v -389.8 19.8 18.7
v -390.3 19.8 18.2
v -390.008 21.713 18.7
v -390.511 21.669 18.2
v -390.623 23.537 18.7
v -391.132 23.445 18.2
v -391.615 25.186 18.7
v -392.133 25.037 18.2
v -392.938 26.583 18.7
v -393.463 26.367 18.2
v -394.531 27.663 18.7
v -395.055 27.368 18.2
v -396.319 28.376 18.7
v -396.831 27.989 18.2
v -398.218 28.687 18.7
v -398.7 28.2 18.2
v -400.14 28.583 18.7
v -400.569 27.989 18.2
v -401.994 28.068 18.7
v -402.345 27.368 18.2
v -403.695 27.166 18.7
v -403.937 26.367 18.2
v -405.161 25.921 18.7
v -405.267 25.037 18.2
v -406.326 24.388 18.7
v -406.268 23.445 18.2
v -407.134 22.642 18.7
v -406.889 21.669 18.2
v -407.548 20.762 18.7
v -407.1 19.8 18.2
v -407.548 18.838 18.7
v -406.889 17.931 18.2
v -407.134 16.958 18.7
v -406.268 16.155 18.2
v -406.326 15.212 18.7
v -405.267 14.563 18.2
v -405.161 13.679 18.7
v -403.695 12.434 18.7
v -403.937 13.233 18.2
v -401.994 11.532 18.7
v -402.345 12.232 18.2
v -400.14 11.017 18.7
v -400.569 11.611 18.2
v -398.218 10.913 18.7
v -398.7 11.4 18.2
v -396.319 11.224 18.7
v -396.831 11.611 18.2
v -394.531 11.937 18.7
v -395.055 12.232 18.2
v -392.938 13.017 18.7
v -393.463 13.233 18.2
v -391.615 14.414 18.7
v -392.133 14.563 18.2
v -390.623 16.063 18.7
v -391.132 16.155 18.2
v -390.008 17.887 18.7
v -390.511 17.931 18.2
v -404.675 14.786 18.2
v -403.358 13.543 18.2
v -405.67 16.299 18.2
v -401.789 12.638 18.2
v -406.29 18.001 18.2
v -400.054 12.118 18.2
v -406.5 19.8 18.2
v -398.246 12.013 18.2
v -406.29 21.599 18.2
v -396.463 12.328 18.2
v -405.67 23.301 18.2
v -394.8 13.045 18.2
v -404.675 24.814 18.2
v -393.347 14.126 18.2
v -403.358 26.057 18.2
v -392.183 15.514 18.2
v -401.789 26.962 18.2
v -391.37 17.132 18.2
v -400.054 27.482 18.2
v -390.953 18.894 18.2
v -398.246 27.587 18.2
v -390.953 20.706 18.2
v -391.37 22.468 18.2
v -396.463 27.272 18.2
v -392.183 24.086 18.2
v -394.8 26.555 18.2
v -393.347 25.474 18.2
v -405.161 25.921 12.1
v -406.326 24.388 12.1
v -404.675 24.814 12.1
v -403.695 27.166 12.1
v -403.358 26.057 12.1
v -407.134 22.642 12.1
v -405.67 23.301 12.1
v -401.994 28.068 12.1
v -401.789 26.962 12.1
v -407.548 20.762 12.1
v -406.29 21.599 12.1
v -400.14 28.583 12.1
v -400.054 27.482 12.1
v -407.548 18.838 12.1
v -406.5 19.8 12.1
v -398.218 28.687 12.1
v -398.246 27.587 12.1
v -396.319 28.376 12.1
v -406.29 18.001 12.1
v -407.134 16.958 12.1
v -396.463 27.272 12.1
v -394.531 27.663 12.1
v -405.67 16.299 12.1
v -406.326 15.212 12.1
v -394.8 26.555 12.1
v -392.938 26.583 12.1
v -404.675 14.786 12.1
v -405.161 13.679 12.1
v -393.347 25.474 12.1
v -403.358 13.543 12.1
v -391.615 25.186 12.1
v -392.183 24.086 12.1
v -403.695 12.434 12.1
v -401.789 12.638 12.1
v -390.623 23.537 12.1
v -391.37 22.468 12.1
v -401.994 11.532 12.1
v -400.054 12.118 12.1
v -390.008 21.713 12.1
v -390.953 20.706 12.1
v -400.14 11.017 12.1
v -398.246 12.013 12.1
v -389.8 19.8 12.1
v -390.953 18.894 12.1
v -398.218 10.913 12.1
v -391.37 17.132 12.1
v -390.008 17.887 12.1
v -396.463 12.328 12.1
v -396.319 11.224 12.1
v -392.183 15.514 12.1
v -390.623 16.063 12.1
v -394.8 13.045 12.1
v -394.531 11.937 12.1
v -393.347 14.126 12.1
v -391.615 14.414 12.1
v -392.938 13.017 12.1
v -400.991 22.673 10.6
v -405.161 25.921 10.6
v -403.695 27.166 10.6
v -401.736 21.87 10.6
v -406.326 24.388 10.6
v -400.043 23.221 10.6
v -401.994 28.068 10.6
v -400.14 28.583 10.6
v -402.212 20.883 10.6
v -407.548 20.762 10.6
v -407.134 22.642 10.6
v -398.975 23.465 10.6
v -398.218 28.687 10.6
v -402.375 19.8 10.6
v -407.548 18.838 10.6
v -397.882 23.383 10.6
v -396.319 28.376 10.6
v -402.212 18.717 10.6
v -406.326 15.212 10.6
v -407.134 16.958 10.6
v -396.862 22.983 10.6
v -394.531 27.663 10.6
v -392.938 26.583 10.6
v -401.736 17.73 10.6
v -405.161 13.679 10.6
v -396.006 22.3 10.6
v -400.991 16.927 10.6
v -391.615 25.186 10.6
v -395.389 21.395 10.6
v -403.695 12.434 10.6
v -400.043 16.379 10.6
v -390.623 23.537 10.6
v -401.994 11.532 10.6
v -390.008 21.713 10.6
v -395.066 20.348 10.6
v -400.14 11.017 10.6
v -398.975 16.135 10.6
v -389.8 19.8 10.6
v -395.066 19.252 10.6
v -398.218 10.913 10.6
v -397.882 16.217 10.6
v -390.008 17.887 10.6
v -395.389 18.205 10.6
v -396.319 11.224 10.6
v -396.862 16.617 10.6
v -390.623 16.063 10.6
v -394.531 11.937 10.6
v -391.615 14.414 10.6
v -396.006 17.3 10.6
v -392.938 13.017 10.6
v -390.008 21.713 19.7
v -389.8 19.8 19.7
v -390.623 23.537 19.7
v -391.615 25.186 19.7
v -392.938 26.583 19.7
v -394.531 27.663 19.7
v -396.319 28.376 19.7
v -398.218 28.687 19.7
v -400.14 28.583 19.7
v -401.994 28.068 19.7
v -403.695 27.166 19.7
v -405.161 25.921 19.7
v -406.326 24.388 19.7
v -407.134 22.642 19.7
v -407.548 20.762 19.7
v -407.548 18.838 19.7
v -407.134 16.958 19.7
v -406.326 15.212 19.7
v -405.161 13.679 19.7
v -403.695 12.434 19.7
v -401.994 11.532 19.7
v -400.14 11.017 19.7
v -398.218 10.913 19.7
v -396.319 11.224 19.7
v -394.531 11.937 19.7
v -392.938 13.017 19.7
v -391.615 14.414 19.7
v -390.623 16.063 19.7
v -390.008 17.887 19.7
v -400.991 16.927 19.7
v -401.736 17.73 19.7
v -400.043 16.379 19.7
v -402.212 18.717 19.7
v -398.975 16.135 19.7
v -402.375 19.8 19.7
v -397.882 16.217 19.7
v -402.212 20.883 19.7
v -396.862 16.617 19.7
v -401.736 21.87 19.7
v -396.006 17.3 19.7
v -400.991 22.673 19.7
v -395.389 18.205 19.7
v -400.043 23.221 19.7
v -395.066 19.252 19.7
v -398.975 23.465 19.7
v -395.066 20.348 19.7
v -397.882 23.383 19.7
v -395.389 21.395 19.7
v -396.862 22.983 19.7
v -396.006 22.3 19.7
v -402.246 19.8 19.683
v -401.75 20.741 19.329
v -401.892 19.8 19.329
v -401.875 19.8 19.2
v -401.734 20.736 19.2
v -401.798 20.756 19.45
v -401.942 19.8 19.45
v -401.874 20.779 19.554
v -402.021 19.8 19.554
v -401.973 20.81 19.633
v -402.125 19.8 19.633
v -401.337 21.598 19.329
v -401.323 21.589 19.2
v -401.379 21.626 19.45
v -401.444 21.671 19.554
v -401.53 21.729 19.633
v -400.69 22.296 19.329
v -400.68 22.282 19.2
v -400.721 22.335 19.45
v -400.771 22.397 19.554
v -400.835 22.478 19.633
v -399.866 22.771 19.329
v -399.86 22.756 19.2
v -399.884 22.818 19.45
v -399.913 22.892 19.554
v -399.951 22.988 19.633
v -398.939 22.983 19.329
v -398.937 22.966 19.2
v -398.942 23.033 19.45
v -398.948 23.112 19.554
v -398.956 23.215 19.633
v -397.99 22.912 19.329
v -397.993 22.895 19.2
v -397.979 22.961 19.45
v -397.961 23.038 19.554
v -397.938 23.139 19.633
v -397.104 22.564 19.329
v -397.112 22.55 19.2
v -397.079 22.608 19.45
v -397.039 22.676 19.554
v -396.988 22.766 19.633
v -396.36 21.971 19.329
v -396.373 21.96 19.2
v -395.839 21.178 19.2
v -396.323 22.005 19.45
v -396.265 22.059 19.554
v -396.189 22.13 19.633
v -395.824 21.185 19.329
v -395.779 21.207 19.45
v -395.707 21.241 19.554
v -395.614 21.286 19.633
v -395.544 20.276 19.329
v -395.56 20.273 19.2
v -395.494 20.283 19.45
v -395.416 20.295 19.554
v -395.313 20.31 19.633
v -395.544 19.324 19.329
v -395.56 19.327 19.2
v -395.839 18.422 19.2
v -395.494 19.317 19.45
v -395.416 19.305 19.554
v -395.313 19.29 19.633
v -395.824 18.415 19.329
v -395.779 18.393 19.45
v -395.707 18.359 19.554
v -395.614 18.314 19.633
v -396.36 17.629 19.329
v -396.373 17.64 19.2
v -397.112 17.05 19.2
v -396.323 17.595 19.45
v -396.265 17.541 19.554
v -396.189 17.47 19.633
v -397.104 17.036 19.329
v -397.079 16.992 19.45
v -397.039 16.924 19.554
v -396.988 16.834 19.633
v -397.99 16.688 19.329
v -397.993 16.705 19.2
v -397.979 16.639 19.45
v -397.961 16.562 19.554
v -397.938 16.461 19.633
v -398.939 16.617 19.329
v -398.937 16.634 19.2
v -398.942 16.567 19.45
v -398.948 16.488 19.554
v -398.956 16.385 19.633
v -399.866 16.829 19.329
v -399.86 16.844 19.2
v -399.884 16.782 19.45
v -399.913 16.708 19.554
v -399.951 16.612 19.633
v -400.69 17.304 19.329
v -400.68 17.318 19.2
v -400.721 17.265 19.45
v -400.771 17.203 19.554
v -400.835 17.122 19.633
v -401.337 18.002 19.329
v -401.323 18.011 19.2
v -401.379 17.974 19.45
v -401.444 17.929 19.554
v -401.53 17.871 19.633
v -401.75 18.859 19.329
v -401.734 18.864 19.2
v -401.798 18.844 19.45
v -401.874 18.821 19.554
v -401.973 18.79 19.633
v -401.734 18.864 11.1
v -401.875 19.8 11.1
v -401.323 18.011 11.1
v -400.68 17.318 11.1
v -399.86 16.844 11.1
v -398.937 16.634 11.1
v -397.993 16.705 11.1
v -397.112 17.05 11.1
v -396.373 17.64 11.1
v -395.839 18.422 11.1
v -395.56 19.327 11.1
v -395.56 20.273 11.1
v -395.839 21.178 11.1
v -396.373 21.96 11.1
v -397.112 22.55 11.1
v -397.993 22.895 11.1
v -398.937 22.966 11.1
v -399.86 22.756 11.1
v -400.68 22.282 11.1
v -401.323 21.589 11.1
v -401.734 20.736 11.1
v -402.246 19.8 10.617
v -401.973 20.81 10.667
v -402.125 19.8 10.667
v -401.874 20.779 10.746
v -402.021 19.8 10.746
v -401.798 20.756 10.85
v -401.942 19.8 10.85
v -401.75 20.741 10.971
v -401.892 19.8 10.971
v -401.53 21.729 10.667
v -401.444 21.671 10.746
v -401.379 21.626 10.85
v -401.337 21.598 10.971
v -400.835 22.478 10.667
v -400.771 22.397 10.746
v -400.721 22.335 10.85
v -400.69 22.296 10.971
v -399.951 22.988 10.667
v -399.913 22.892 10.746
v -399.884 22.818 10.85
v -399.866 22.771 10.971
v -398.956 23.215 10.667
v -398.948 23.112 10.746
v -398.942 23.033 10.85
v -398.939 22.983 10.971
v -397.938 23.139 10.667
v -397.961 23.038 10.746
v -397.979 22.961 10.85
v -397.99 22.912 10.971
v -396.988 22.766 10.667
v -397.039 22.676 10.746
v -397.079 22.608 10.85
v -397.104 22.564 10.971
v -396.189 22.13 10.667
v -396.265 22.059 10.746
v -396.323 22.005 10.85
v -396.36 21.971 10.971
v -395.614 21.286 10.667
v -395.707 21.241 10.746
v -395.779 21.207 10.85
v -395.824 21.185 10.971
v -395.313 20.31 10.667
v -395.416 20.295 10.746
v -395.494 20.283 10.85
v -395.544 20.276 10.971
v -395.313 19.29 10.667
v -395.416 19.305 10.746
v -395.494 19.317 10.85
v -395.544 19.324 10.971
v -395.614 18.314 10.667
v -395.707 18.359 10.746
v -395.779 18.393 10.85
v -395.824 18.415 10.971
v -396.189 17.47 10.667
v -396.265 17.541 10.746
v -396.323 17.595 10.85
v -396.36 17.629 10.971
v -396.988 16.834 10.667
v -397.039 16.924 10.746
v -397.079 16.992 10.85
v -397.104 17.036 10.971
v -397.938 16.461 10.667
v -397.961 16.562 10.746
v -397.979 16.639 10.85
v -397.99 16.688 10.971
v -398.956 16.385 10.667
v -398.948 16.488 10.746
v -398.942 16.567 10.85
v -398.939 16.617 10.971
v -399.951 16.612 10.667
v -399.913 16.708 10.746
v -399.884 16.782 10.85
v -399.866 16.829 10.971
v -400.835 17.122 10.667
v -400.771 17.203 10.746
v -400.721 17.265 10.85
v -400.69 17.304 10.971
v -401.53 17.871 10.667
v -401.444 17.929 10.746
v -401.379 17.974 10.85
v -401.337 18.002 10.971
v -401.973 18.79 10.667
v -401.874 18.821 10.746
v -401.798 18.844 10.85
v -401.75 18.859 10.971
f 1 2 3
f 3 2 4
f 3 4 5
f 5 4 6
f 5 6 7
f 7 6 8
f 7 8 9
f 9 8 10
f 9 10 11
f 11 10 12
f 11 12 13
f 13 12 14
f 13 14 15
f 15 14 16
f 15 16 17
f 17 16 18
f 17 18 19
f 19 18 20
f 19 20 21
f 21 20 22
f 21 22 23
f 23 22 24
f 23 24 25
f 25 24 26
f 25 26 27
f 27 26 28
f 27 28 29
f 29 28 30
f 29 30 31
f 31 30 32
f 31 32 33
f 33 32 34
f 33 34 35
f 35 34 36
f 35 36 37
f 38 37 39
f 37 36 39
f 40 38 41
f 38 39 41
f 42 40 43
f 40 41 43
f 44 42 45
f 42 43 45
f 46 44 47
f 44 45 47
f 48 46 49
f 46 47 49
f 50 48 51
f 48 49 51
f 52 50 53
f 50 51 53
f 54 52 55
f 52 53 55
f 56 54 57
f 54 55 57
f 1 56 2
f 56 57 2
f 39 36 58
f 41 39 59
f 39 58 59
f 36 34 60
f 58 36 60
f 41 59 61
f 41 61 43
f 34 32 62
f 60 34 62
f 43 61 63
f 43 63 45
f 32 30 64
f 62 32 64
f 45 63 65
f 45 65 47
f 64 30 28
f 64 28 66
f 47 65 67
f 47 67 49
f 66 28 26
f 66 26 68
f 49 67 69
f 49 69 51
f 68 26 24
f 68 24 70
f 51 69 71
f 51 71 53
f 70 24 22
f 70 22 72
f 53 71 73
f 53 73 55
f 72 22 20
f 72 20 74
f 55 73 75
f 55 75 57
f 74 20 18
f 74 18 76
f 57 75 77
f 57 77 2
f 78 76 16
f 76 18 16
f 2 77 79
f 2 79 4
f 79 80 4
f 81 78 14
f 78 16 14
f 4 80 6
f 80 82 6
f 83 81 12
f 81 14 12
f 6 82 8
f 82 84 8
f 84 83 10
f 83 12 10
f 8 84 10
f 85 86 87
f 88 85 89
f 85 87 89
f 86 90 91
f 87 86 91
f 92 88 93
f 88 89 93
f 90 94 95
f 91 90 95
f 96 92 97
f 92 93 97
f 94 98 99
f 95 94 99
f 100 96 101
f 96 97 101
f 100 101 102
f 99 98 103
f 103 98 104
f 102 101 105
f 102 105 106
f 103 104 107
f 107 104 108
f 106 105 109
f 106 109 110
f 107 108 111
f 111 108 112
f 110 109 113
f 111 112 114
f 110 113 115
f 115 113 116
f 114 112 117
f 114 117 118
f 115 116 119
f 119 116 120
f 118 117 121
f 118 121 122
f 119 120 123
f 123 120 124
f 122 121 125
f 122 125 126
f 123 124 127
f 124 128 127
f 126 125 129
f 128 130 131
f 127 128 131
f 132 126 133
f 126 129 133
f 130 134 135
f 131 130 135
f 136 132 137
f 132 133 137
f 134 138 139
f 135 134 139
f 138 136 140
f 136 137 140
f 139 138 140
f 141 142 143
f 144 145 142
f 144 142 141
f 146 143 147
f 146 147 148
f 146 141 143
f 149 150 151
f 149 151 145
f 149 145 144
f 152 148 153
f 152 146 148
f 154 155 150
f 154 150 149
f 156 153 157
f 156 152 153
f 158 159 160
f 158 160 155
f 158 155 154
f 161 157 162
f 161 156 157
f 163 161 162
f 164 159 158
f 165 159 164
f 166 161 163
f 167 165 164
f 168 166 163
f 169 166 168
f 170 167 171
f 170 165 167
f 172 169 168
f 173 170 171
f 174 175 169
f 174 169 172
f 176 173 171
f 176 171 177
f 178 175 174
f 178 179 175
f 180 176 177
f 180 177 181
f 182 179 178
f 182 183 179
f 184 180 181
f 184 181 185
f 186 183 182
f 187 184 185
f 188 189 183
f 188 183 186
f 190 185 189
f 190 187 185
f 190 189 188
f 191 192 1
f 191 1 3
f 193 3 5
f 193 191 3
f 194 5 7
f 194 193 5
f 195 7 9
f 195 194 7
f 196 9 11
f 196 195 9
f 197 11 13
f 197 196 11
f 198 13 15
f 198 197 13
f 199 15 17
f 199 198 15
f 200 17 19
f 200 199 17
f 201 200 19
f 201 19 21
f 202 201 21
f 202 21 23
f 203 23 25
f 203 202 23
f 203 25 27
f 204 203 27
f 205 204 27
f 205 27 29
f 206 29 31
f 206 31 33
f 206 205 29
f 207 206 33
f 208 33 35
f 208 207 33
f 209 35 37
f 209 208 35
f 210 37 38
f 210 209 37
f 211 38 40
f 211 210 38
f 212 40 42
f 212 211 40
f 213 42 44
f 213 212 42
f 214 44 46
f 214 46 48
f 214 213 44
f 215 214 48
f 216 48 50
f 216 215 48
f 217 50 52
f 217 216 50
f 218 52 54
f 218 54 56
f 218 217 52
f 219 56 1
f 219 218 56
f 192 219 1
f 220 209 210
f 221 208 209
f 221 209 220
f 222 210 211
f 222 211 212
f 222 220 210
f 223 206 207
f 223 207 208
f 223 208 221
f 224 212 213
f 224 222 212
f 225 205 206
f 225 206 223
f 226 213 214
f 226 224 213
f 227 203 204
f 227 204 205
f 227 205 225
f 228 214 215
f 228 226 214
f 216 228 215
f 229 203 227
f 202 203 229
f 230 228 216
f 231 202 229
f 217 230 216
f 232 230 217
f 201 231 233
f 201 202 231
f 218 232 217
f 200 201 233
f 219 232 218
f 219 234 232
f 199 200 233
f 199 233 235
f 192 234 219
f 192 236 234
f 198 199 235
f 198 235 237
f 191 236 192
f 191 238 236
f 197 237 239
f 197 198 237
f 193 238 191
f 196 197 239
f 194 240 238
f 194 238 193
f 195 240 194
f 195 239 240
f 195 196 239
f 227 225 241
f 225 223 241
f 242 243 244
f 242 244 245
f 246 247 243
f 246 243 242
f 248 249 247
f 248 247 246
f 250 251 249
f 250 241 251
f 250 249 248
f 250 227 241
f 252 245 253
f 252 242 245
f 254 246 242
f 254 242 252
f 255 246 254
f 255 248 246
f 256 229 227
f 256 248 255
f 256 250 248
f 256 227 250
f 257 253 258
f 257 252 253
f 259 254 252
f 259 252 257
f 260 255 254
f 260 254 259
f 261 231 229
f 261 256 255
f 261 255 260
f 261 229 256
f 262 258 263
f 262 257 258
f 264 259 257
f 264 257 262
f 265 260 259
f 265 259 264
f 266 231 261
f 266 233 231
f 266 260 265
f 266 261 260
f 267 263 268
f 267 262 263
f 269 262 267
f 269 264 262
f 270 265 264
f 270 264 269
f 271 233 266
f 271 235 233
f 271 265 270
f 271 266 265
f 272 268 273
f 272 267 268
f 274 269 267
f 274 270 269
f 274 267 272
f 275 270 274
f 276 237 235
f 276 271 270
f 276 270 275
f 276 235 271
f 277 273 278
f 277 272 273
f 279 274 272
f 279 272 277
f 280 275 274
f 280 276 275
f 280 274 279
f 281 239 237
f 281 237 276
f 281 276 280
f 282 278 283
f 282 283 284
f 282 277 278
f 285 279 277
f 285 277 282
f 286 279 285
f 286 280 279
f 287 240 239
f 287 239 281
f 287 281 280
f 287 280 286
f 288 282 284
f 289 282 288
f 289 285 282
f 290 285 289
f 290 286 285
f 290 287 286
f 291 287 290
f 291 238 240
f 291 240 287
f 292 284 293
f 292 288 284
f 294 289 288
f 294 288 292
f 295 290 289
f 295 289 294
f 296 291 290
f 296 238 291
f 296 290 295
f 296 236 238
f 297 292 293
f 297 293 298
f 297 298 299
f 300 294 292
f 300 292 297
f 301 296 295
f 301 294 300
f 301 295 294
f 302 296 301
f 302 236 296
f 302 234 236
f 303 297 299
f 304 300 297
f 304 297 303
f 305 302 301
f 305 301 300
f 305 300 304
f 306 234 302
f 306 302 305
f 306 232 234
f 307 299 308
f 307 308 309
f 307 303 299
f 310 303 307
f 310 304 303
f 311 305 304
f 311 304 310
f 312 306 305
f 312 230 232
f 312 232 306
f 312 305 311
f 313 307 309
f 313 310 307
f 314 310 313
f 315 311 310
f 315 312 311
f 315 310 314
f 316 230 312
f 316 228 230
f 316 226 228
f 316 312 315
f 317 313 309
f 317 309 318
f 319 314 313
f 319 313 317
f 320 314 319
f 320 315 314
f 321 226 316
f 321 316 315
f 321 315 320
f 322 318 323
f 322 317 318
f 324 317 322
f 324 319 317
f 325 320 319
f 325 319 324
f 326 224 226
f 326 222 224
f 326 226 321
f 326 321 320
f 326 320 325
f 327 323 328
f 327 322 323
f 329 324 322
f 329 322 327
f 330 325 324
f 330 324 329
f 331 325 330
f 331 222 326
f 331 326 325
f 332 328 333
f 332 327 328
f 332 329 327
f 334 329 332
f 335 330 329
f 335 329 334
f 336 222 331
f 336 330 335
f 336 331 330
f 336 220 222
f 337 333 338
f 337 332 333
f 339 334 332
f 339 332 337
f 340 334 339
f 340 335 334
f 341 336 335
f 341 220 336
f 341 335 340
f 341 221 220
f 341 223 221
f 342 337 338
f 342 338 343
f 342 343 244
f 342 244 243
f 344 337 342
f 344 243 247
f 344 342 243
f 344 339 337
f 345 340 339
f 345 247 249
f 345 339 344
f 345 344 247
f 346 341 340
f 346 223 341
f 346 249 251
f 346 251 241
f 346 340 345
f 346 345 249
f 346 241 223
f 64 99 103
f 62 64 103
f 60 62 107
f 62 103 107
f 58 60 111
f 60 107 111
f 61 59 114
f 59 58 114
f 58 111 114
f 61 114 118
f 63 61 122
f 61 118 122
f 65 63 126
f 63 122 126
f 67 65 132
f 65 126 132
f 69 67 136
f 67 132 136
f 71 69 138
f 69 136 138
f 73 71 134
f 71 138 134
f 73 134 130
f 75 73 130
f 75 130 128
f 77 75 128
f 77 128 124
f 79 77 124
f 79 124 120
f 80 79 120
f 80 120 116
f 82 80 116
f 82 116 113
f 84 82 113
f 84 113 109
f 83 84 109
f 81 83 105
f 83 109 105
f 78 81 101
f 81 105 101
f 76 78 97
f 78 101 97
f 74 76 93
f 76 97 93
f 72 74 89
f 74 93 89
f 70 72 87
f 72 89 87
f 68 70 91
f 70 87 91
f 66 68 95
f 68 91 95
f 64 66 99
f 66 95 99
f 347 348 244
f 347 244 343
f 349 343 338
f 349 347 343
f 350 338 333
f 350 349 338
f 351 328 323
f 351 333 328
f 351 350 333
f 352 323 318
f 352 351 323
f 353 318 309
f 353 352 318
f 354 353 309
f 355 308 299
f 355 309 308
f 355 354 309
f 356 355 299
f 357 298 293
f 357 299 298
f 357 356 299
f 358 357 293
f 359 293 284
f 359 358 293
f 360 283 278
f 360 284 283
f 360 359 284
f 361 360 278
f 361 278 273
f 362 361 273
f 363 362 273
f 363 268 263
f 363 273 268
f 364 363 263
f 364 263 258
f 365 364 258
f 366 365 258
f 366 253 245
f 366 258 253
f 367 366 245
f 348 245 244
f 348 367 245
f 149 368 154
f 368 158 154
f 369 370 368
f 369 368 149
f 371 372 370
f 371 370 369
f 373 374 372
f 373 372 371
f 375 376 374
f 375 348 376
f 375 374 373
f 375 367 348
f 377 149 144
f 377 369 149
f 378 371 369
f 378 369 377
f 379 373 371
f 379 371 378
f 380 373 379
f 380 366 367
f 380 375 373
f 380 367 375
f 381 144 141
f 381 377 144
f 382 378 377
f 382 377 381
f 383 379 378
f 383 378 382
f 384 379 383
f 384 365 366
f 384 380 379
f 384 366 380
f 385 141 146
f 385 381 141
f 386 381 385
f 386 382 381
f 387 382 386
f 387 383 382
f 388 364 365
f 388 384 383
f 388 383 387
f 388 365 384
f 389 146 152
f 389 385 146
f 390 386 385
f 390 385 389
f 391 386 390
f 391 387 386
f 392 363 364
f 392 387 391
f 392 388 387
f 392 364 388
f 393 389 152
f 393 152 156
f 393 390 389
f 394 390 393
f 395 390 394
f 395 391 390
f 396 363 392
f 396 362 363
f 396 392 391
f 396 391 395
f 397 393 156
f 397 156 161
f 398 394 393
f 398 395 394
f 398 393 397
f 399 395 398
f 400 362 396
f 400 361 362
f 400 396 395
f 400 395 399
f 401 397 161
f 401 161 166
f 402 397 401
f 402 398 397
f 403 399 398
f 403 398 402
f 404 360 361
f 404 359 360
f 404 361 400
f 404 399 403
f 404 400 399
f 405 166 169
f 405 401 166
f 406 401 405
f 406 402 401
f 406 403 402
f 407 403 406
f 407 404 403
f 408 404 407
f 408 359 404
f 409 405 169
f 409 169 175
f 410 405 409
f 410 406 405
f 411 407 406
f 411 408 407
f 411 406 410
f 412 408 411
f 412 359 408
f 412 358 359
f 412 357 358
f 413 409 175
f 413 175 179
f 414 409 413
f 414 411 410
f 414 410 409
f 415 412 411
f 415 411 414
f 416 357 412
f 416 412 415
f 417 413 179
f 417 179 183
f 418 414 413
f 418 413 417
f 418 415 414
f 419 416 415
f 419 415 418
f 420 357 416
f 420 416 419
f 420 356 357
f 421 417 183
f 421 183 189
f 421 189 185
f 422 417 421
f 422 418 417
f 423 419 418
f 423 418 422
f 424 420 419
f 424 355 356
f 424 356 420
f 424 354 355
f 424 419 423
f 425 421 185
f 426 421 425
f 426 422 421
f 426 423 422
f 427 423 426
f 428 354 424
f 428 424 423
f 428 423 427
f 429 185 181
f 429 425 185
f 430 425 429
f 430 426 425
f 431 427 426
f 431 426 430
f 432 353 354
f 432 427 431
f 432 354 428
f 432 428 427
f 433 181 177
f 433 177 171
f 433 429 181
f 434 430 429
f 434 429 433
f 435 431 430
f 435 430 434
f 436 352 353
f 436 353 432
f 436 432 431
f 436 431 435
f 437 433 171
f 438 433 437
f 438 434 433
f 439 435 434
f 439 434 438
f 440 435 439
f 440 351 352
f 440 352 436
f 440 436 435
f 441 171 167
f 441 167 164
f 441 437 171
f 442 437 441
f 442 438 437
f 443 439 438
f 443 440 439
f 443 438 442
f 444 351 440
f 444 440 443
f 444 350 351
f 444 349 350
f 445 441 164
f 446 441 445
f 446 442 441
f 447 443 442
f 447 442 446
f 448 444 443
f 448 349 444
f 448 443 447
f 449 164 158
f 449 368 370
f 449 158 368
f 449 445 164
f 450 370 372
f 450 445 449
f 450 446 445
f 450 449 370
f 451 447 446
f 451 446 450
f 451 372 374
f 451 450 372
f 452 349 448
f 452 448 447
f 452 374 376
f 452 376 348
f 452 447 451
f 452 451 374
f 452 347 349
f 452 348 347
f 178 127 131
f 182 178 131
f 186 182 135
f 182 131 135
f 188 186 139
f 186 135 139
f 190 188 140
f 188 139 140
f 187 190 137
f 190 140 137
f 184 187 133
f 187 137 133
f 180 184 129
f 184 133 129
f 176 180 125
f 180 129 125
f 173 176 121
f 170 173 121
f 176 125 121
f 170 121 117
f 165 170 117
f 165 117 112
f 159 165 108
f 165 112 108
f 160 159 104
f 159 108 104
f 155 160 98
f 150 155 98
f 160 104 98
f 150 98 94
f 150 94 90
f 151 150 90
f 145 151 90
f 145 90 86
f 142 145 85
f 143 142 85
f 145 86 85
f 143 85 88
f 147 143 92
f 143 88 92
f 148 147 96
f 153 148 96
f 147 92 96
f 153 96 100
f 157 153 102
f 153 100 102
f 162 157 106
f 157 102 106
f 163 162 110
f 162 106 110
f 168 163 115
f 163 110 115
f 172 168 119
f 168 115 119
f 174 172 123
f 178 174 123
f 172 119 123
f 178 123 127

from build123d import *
from OCP.BRepFilletAPI import BRepFilletAPI_MakeChamfer

# Parameters (mm, degrees)
ESBO_O1_W                  = 97.4
ESBO_O1_H                  = 1.25
RESSALTO_EXTRUS_O1_DEPTH   = 6.2
ESBO_O2_W                  = 97.4
ESBO_O2_H                  = 1.25
RESSALTO_EXTRUS_O2_DEPTH   = 40.6
FILETE1_R                  = 1
ESBO_O3_R                  = 2
ESBO_O3_R_2                = 2.5
ESBO_O3_R_3                = 6
ESBO_O3_W                  = 4
ESBO_O3_H                  = 6
ESBO_O3_W_2                = 6
ESBO_O3_H_2                = 8
CORTE_EXTRUS_O1_DEPTH      = 40.6
ESBO_O6_R                  = 3
RESSALTO_EXTRUS_O3_DEPTH   = 22.5
ESBO_O7_R                  = 2.25
RESSALTO_EXTRUS_O4_DEPTH   = 12.3
FILETE2_R                  = 0.25
ESBO_O12_R                 = 4
RESSALTO_EXTRUS_O7_DEPTH   = 3
ESBO_O13_R                 = 4.5
RESSALTO_EXTRUS_O8_DEPTH   = 8.1
ESBO_O8_R                  = 16.365
ESBO_O8_R_2                = 2.3
RESSALTO_EXTRUS_O5_DEPTH   = 4
ESBO_O9_R                  = 4
ESBO_O9_R_2                = 2.3
RESSALTO_EXTRUS_O6_DEPTH   = 8.9
ESBO_O10_R                 = 13.865
ESBO_O10_R_2               = 4.9
CORTE_EXTRUS_O2_DEPTH      = 1
CORTE_EXTRUS_O3_START      = -1
ESBO_O11_R                 = 13.86
ESBO_O11_R_2               = 4.9
CORTE_EXTRUS_O3_DEPTH      = 1
ESBO_O14_R                 = 18.34
ESBO_O14_R_2               = 3.1
RESSALTO_EXTRUS_O9_DEPTH   = 4
ESBO_O15_R                 = 7.8
ESBO_O15_R_2               = 3.1
RESSALTO_EXTRUS_O10_DEPTH  = 11.6
RESSALTO_EXTRUS_O11_START  = -1.5
ESBO_O16_R                 = 8.9
ESBO_O16_R_2               = 3.1
RESSALTO_EXTRUS_O11_DEPTH  = 1.5
CHANFRO1_SIZE              = 0.5
ESBO_O17_R                 = 3.5
ESBO_O17_R_2               = 3.1
RESSALTO_EXTRUS_O12_DEPTH  = 0.5
CORTE_EXTRUS_O4_START      = -1
ESBO_O18_R                 = 15.84
ESBO_O18_R_2               = 8.9
CORTE_EXTRUS_O4_DEPTH      = 1
ESBO_O19_R                 = 15.825
ESBO_O19_R_2               = 8.9
CORTE_EXTRUS_O5_DEPTH      = 1
RESSALTO_EXTRUS_O13_DEPTH  = 0.5
ESBO_O21_R                 = 1.75
RESSALTO_EXTRUS_O14_DEPTH  = 0.92
ESBO_O23_R                 = 17.675026778
RESSALTO_EXTRUS_O15_DEPTH  = 15
FILETE4_R                  = 1
ESBO_O24_R                 = 2.05
ESBO_O24_R_2               = 1.75
RESSALTO_EXTRUS_O16_DEPTH  = 1
ESBO_O25_R                 = 2.5
RESSALTO_EXTRUS_O17_DEPTH  = 0.1
ESBO_O26_R                 = 1
RESSALTO_EXTRUS_O18_DEPTH  = 0.5
FILETE6_R                  = 0.1
ESBO_O27_R                 = 4.99
RESSALTO_EXTRUS_O19_DEPTH  = 16.57
RESSALTO_EXTRUS_O20_START  = -25
ESBO_O28_R                 = 1
RESSALTO_EXTRUS_O20_DEPTH  = 25
FILETE5_R                  = 0.25
ESBO_O29_R                 = 3.59
RESSALTO_EXTRUS_O21_DEPTH  = 6
ESBO_O30_R                 = 2.7
RESSALTO_EXTRUS_O22_DEPTH  = 2
FILETE7_R                  = 1.4
CORTE_EXTRUS_O6_DEPTH      = 1.4
ESBO_O32_R                 = 1.75
RESSALTO_EXTRUS_O23_DEPTH  = 7.8
CHANFRO2_SIZE              = 1
CHANFRO2_SIZE2             = 0.466307658
RESSALTO_EXTRUS_O24_DEPTH  = 10
ESBO_O34_R                 = 2
RESSALTO_EXTRUS_O25_DEPTH  = 5
ESBO_O35_R                 = 7.8
RESSALTO_EXTRUS_O26_DEPTH  = 7.6
ESBO_O37_R                 = 8.9
RESSALTO_EXTRUS_O27_DEPTH  = 1.5
CHANFRO3_SIZE              = 0.5
ESBO_O38_R                 = 8.9
RESSALTO_EXTRUS_O28_DEPTH  = 1.5
CORTE_EXTRUS_O7_DEPTH      = 16
CORTE_EXTRUS_O7_DEPTH_BACK = 35.5
ESBO_O39_R                 = 3.175
FILETE11_R                 = 0.5
FILETE12_R                 = 0.25
FILETE13_R                 = 0.5


with BuildPart() as part:
    # Esboço1 → Ressalto-extrusão1 (new body)
    with BuildSketch(Plane.XY):
        Rectangle(ESBO_O1_W, ESBO_O1_H)
    extrude(amount=RESSALTO_EXTRUS_O1_DEPTH)

    # Esboço2 → Ressalto-extrusão2 (add)
    with BuildSketch(Plane(origin=(0, -0.625, 0), x_dir=(1, 0, 0), z_dir=(0, 1, 0))):
        with Locations((0, -0.625)):
            Rectangle(ESBO_O2_W, ESBO_O2_H)
    extrude(amount=RESSALTO_EXTRUS_O2_DEPTH)

    # Filete1
    filete1_edges = [part.edges().sort_by_distance(p)[0] for p in [
        (48.7, 0, 6.2),
        (48.7, 39.975, 0.625),
        (-48.7, 39.975, 0.625),
        (-48.7, 0, 6.2),
    ]]
    fillet(filete1_edges, radius=FILETE1_R)

    # Esboço3 → Corte-extrusão1 (cut)
    with BuildSketch(Plane.XY.offset(1.25)):
        with Locations((-43.7, 4.975)):
            Circle(ESBO_O3_R)
        with Locations((0, 4.975)):
            Circle(ESBO_O3_R)
        with Locations((38.95, 19.8)):
            Circle(ESBO_O3_R_2)
        with Locations((14.7, 19.8)):
            Circle(ESBO_O3_R_3)
        with Locations((41.7, 30.975)):
            Rectangle(ESBO_O3_W, ESBO_O3_H)
        with Locations((41.7, 8.975)):
            Rectangle(ESBO_O3_W, ESBO_O3_H)
        with Locations((-33.7, 8.975)):
            Rectangle(ESBO_O3_W_2, ESBO_O3_H_2)
        with BuildLine():
            Line((27.7, 36.975), (30.7, 36.975))
            ThreePointArc((30.7, 36.975), (32.7, 34.975), (30.7, 32.975))
            Line((30.7, 32.975), (27.7, 32.975))
            ThreePointArc((27.7, 32.975), (25.7, 34.975), (27.7, 36.975))
        make_face()
        with Locations((-33.7, 30.975)):
            Rectangle(ESBO_O3_W_2, ESBO_O3_H_2)
    extrude(amount=-CORTE_EXTRUS_O1_DEPTH, mode=Mode.SUBTRACT)

    # Esboço6 → Ressalto-extrusão3 (add)
    with BuildSketch(Plane(origin=(0, 0, 0), x_dir=(-1, 0, 0), z_dir=(0, 0, -1))):
        with Locations((25.7, 19.8)):
            Circle(ESBO_O6_R)
    extrude(amount=-RESSALTO_EXTRUS_O3_DEPTH)

    # Esboço7 → Ressalto-extrusão4 (add)
    with BuildSketch(Plane(origin=(0, 0, 0), x_dir=(-1, 0, 0), z_dir=(0, 0, -1))):
        with Locations((4.1, 23.975)):
            Circle(ESBO_O7_R)
    extrude(amount=-RESSALTO_EXTRUS_O4_DEPTH)

    # Filete2
    filete2_edges = [part.edges().sort_by_distance(p)[0] for p in [
        (-22.7, 19.8, 22.5),
        (-1.85, 23.975, 12.3),
    ]]
    fillet(filete2_edges, radius=FILETE2_R)

    # Esboço12 → Ressalto-extrusão7 (add)
    with BuildSketch(Plane.XY):
        with Locations(Location((-4.1, 23.975, 0), (0, 0, 180))):
            Circle(ESBO_O12_R)
    extrude(amount=RESSALTO_EXTRUS_O7_DEPTH)

    # Esboço13 → Ressalto-extrusão8 (add)
    with BuildSketch(Plane(origin=(0, 0, 0), x_dir=(-1, 0, 0), z_dir=(0, 0, -1))):
        with Locations((25.7, 19.8)):
            Circle(ESBO_O13_R)
    extrude(amount=-RESSALTO_EXTRUS_O8_DEPTH)

    # Esboço8 → Ressalto-extrusão5 (add)
    with BuildSketch(Plane.XY.offset(3)):
        with Locations((-4.1, 23.975)):
            Circle(ESBO_O8_R)
        with Locations((-4.1, 23.975)):
            Circle(ESBO_O8_R_2, mode=Mode.SUBTRACT)
    extrude(amount=RESSALTO_EXTRUS_O5_DEPTH)

    # Esboço9 → Ressalto-extrusão6 (add)
    with BuildSketch(Plane.XY.offset(3)):
        with Locations(Location((-4.1, 23.975, 0), (0, 0, 180))):
            Circle(ESBO_O9_R)
        with Locations((-4.1, 23.975)):
            Circle(ESBO_O9_R_2, mode=Mode.SUBTRACT)
    extrude(amount=RESSALTO_EXTRUS_O6_DEPTH)

    # Esboço10 → Corte-extrusão2 (cut)
    with BuildSketch(Plane.XY.offset(7)):
        with Locations((-4.1, 23.975)):
            Circle(ESBO_O10_R)
        with Locations((-4.1, 23.975)):
            Circle(ESBO_O10_R_2, mode=Mode.SUBTRACT)
    extrude(amount=-CORTE_EXTRUS_O2_DEPTH, mode=Mode.SUBTRACT)

    # Esboço11 → Corte-extrusão3 (cut)
    with BuildSketch(Plane(origin=(0, 0, 3), x_dir=(-1, 0, 0), z_dir=(0, 0, -1)).offset(CORTE_EXTRUS_O3_START)):
        with Locations((4.1, 23.975)):
            Circle(ESBO_O11_R)
        with Locations(Location((4.1, 23.975, 0), (0, 0, 180))):
            Circle(ESBO_O11_R_2, mode=Mode.SUBTRACT)
    extrude(amount=CORTE_EXTRUS_O3_DEPTH, mode=Mode.SUBTRACT)

    # Esboço14 → Ressalto-extrusão9 (add)
    with BuildSketch(Plane.XY.offset(8.1)):
        with Locations(Location((-25.7, 19.8, 0), (0, 0, 15.545528491))):
            Circle(ESBO_O14_R)
        with Locations((-25.7, 19.8)):
            Circle(ESBO_O14_R_2, mode=Mode.SUBTRACT)
    extrude(amount=RESSALTO_EXTRUS_O9_DEPTH)

    # Esboço15 → Ressalto-extrusão10 (add)
    with BuildSketch(Plane.XY.offset(8.1)):
        with Locations((-25.7, 19.8)):
            Circle(ESBO_O15_R)
        with Locations((-25.7, 19.8)):
            Circle(ESBO_O15_R_2, mode=Mode.SUBTRACT)
    extrude(amount=RESSALTO_EXTRUS_O10_DEPTH)

    # Esboço16 → Ressalto-extrusão11 (add)
    with BuildSketch(Plane.XY.offset(19.7).offset(RESSALTO_EXTRUS_O11_START)):
        with Locations((-25.7, 19.8)):
            Circle(ESBO_O16_R)
        with Locations((-25.7, 19.8)):
            Circle(ESBO_O16_R_2, mode=Mode.SUBTRACT)
    extrude(amount=RESSALTO_EXTRUS_O11_DEPTH)

    # Chanfro1
    chanfro1_edges = [part.edges().sort_by_distance(p)[0] for p in [
        (-34.6, 19.8, 18.2),
    ]]
    chamfer(chanfro1_edges, length=CHANFRO1_SIZE)

    # Esboço17 → Ressalto-extrusão12 (add)
    with BuildSketch(Plane.XY.offset(19.7)):
        with Locations((-25.7, 19.8)):
            Circle(ESBO_O17_R)
        with Locations((-25.7, 19.8)):
            Circle(ESBO_O17_R_2, mode=Mode.SUBTRACT)
    extrude(amount=RESSALTO_EXTRUS_O12_DEPTH)

    # Esboço18 → Corte-extrusão4 (cut)
    with BuildSketch(Plane.XY.offset(12.1).offset(CORTE_EXTRUS_O4_START)):
        with Locations((-25.7, 19.8)):
            Circle(ESBO_O18_R)
        with Locations((-25.7, 19.8)):
            Circle(ESBO_O18_R_2, mode=Mode.SUBTRACT)
    extrude(amount=CORTE_EXTRUS_O4_DEPTH, mode=Mode.SUBTRACT)

    # Esboço19 → Corte-extrusão5 (cut)
    with BuildSketch(Plane(origin=(0, 0, 8.1), x_dir=(-1, 0, 0), z_dir=(0, 0, -1))):
        with Locations((25.7, 19.8)):
            Circle(ESBO_O19_R)
        with Locations(Location((25.7, 19.8, 0), (0, 0, 180))):
            Circle(ESBO_O19_R_2, mode=Mode.SUBTRACT)
    extrude(amount=-CORTE_EXTRUS_O5_DEPTH, mode=Mode.SUBTRACT)

    # Esboço20 → Ressalto-extrusão13 (add)
    with BuildSketch(Plane.XY.offset(20.2)):
        with BuildLine():
            Line((-28.322721615, 20.626940949), (-29.67498238, 21.05330713))
            ThreePointArc((-29.67498238, 21.05330713), (-29.981119219, 21.326162864), (-29.980184512, 21.736247175))
            ThreePointArc((-29.980184512, 21.736247175), (-28.137076875, 23.816178393), (-25.441102958, 24.490629478))
            ThreePointArc((-25.441102958, 24.490629478), (-25.076922131, 24.302102712), (-24.9762544, 23.904565262))
            Line((-24.9762544, 23.904565262), (-25.222467511, 22.508221321))
            ThreePointArc((-25.222467511, 22.508221321), (-24.430191314, 22.239279791), (-23.755456352, 21.744543648))
            Line((-23.755456352, 21.744543648), (-22.474650348, 23.025349652))
            ThreePointArc((-22.474650348, 23.025349652), (-22.187573749, 23.840156974), (-22.642480013, 24.574584803))
            ThreePointArc((-22.642480013, 24.574584803), (-31.36966388, 19.8), (-22.642480013, 15.025415197))
            ThreePointArc((-22.642480013, 15.025415197), (-22.187573749, 15.759843026), (-22.474650348, 16.574650348))
            Line((-22.474650348, 16.574650348), (-23.755456352, 17.855456352))
            ThreePointArc((-23.755456352, 17.855456352), (-24.430191314, 17.360720209), (-25.222467511, 17.091778679))
            Line((-25.222467511, 17.091778679), (-24.9762544, 15.695434738))
            ThreePointArc((-24.9762544, 15.695434738), (-25.076922131, 15.297897288), (-25.441102958, 15.109370522))
            ThreePointArc((-25.441102958, 15.109370522), (-28.137076875, 15.783821607), (-29.980184512, 17.863752825))
            ThreePointArc((-29.980184512, 17.863752825), (-29.981119219, 18.273837136), (-29.67498238, 18.54669287))
            Line((-29.67498238, 18.54669287), (-28.322721615, 18.973059051))
            ThreePointArc((-28.322721615, 18.973059051), (-28.45, 19.8), (-28.322721615, 20.626940949))
        make_face()
    extrude(amount=RESSALTO_EXTRUS_O13_DEPTH)

    # Esboço21 → Ressalto-extrusão14 (add)
    with BuildSketch(Plane(origin=(0, 0, 0), x_dir=(-1, 0, 0), z_dir=(0, 0, -1))):
        with BuildLine():
            Line((3.595164465, 5.161527392), (2.779555471, 20.88173038))
            ThreePointArc((2.779555471, 20.88173038), (-2.196938457, 32.222448714), (-13.433733778, 37.429349428))
            Line((-13.433733778, 37.429349428), (-29.134017665, 38.565609025))
            ThreePointArc((-29.134017665, 38.565609025), (-31.845866586, 37.610857858), (-32.993876913, 34.975))
            Line((-32.993876913, 34.975), (-32.993876913, 30.076020514))
            Line((-32.993876913, 30.076020514), (-30.487753652, 27.518219171))
            ThreePointArc((-30.487753652, 27.518219171), (-27.196938457, 7.727551286), (-7.477551833, 4.033530282))
            Line((-7.477551833, 4.033530282), (-4.87273477, 1.375))
            Line((-4.87273477, 1.375), (0, 1.375))
            ThreePointArc((0, 1.375), (2.610699007, 2.49624009), (3.595164465, 5.161527392))
        make_face()
        with Locations((0, 4.975)):
            Circle(ESBO_O21_R, mode=Mode.SUBTRACT)
        with Locations((-29.393876913, 34.975)):
            Circle(ESBO_O21_R, mode=Mode.SUBTRACT)
    extrude(amount=RESSALTO_EXTRUS_O14_DEPTH)

    # Esboço23 → Ressalto-extrusão15 (add)
    with BuildSketch(Plane.XY):
        with Locations((14.7, 19.8)):
            Circle(ESBO_O23_R)
    extrude(amount=-RESSALTO_EXTRUS_O15_DEPTH)

    # Filete4
    filete4_edges = [part.edges().sort_by_distance(p)[0] for p in [
        (-2.975026778, 19.8, -15),
    ]]
    fillet(filete4_edges, radius=FILETE4_R)

    # Esboço24 → Ressalto-extrusão16 (add)
    # profile 1 of 2: a face of its own
    with BuildSketch(Plane(origin=(0, 0, -0.92), x_dir=(-1, 0, 0), z_dir=(0, 0, -1))):
        with Locations((0, 4.975)):
            Circle(ESBO_O24_R)
        with Locations((0, 4.975)):
            Circle(ESBO_O24_R_2, mode=Mode.SUBTRACT)
    # profile 2 of 2: a face of its own
    with BuildSketch(Plane(origin=(0, 0, -0.92), x_dir=(-1, 0, 0), z_dir=(0, 0, -1))):
        with Locations((-29.393876913, 34.975)):
            Circle(ESBO_O24_R)
        with Locations((-29.393876913, 34.975)):
            Circle(ESBO_O24_R_2, mode=Mode.SUBTRACT)
    extrude(amount=RESSALTO_EXTRUS_O16_DEPTH)

    # Esboço25 → Ressalto-extrusão17 (add)
    with BuildSketch(Plane(origin=(0, 0, -15), x_dir=(-1, 0, 0), z_dir=(0, 0, -1))):
        with Locations(Location((-14.7, 19.8, 0), (0, 0, 180))):
            Circle(ESBO_O25_R)
    extrude(amount=RESSALTO_EXTRUS_O17_DEPTH)

    # Esboço26 → Ressalto-extrusão18 (add)
    with BuildSketch(Plane(origin=(0, 0, -15.1), x_dir=(-1, 0, 0), z_dir=(0, 0, -1))):
        with Locations((-14.7, 19.8)):
            Circle(ESBO_O26_R)
    extrude(amount=RESSALTO_EXTRUS_O18_DEPTH)

    # Filete6
    filete6_edges = [part.edges().sort_by_distance(p)[0] for p in [
        (12.2, 19.8, -15.1),
    ]]
    fillet(filete6_edges, radius=FILETE6_R - 0.0001)  # a hair under: the kernel refuses the full size

    # Esboço27 → Ressalto-extrusão19 (add)
    with BuildSketch(Plane.XY.offset(-15)):
        with Locations(Location((14.7, 19.8, 0), (0, 0, 180))):
            Circle(ESBO_O27_R)
    extrude(amount=RESSALTO_EXTRUS_O19_DEPTH)

    # Esboço28 → Ressalto-extrusão20 (add)
    with BuildSketch(Plane(origin=(0, 0, -15.6), x_dir=(-1, 0, 0), z_dir=(0, 0, -1)).offset(RESSALTO_EXTRUS_O20_START)):
        with Locations((-14.7, 19.8)):
            Circle(ESBO_O28_R)
    extrude(amount=RESSALTO_EXTRUS_O20_DEPTH)

    # Filete5
    filete5_edges = [part.edges().sort_by_distance(p)[0] for p in [
        (15.7, 19.8, -15.6),
        (15.7, 19.8, 9.4),
    ]]
    fillet(filete5_edges, radius=FILETE5_R)

    # Esboço29 → Ressalto-extrusão21 (add)
    with BuildSketch(Plane.XY.offset(9.15)):
        with Locations((14.7, 19.8)):
            Circle(ESBO_O29_R)
    extrude(amount=-RESSALTO_EXTRUS_O21_DEPTH)

    # Esboço30 → Ressalto-extrusão22 (add)
    with BuildSketch(Plane.XY.offset(1.25)):
        with Locations(Location((0, 4.975, 0), (0, 0, 180))):
            Circle(ESBO_O30_R)
        with Locations(Location((29.393876913, 34.975, 0), (0, 0, 227.672748848))):
            Circle(ESBO_O30_R)
    extrude(amount=RESSALTO_EXTRUS_O22_DEPTH)

    # Filete7
    filete7_edges = [part.edges().sort_by_distance(p)[0] for p in [
        (2.7, 4.975, 3.25),
        (31.211960314, 36.971139461, 3.25),
    ]]
    fillet(filete7_edges, radius=FILETE7_R)

    # Esboço31 → Corte-extrusão6 (cut)
    with BuildSketch(Plane.XY.offset(3.25)):
        with BuildLine():
            Line((29.093876913, 37.175), (29.693876913, 37.175))
            ThreePointArc((29.693876913, 37.175), (29.83529827, 37.116421356), (29.893876913, 36.975))
            Line((29.893876913, 36.975), (29.893876913, 35.975))
            ThreePointArc((29.893876913, 35.975), (30.040323523, 35.621446609), (30.393876913, 35.475))
            Line((30.393876913, 35.475), (31.393876913, 35.475))
            ThreePointArc((31.393876913, 35.475), (31.53529827, 35.416421356), (31.593876913, 35.275))
            Line((31.593876913, 35.275), (31.593876913, 34.675))
            ThreePointArc((31.593876913, 34.675), (31.53529827, 34.533578644), (31.393876913, 34.475))
            Line((31.393876913, 34.475), (30.393876913, 34.475))
            ThreePointArc((30.393876913, 34.475), (30.040323523, 34.328553391), (29.893876913, 33.975))
            Line((29.893876913, 33.975), (29.893876913, 32.975))
            ThreePointArc((29.893876913, 32.975), (29.83529827, 32.833578644), (29.693876913, 32.775))
            Line((29.693876913, 32.775), (29.093876913, 32.775))
            ThreePointArc((29.093876913, 32.775), (28.952455557, 32.833578644), (28.893876913, 32.975))
            Line((28.893876913, 32.975), (28.893876913, 33.975))
            ThreePointArc((28.893876913, 33.975), (28.747430304, 34.328553391), (28.393876913, 34.475))
            Line((28.393876913, 34.475), (27.393876913, 34.475))
            ThreePointArc((27.393876913, 34.475), (27.252455557, 34.533578644), (27.193876913, 34.675))
            Line((27.193876913, 34.675), (27.193876913, 35.275))
            ThreePointArc((27.193876913, 35.275), (27.252455557, 35.416421356), (27.393876913, 35.475))
            Line((27.393876913, 35.475), (28.393876913, 35.475))
            ThreePointArc((28.393876913, 35.475), (28.747430304, 35.621446609), (28.893876913, 35.975))
            Line((28.893876913, 35.975), (28.893876913, 36.975))
            ThreePointArc((28.893876913, 36.975), (28.952455557, 37.116421356), (29.093876913, 37.175))
        make_face()
        with BuildLine():
            Line((-0.142061447, 7.325028719), (0.457938553, 7.325028719))
            ThreePointArc((0.457938553, 7.325028719), (0.59935991, 7.266450075), (0.657938553, 7.125028719))
            Line((0.657938553, 7.125028719), (0.657938553, 6.125028719))
            ThreePointArc((0.657938553, 6.125028719), (0.804385163, 5.771475328), (1.157938553, 5.625028719))
            Line((1.157938553, 5.625028719), (2.157938553, 5.625028719))
            ThreePointArc((2.157938553, 5.625028719), (2.29935991, 5.566450075), (2.357938553, 5.425028719))
            Line((2.357938553, 5.425028719), (2.357938553, 4.825028719))
            ThreePointArc((2.357938553, 4.825028719), (2.29935991, 4.683607363), (2.157938553, 4.625028719))
            Line((2.157938553, 4.625028719), (1.157938553, 4.625028719))
            ThreePointArc((1.157938553, 4.625028719), (0.804385163, 4.478582109), (0.657938553, 4.125028719))
            Line((0.657938553, 4.125028719), (0.657938553, 3.125028719))
            ThreePointArc((0.657938553, 3.125028719), (0.59935991, 2.983607363), (0.457938553, 2.925028719))
            Line((0.457938553, 2.925028719), (-0.142061447, 2.925028719))
            ThreePointArc((-0.142061447, 2.925028719), (-0.283482803, 2.983607363), (-0.342061447, 3.125028719))
            Line((-0.342061447, 3.125028719), (-0.342061447, 4.125028719))
            ThreePointArc((-0.342061447, 4.125028719), (-0.488508056, 4.478582109), (-0.842061447, 4.625028719))
            Line((-0.842061447, 4.625028719), (-1.842061447, 4.625028719))
            ThreePointArc((-1.842061447, 4.625028719), (-1.983482803, 4.683607363), (-2.042061447, 4.825028719))
            Line((-2.042061447, 4.825028719), (-2.042061447, 5.425028719))
            ThreePointArc((-2.042061447, 5.425028719), (-1.983482803, 5.566450075), (-1.842061447, 5.625028719))
            Line((-1.842061447, 5.625028719), (-0.842061447, 5.625028719))
            ThreePointArc((-0.842061447, 5.625028719), (-0.488508056, 5.771475328), (-0.342061447, 6.125028719))
            Line((-0.342061447, 6.125028719), (-0.342061447, 7.125028719))
            ThreePointArc((-0.342061447, 7.125028719), (-0.283482803, 7.266450075), (-0.142061447, 7.325028719))
        make_face()
    extrude(amount=-CORTE_EXTRUS_O6_DEPTH, mode=Mode.SUBTRACT)

    # Esboço32 → Ressalto-extrusão23 (add)
    with BuildSketch(Plane(origin=(0, 0, 1.25), x_dir=(-1, 0, 0), z_dir=(0, 0, -1))):
        with Locations((0, 4.975)):
            Circle(ESBO_O32_R)
        with Locations(Location((-29.393876913, 34.975, 0), (0, 0, 180))):
            Circle(ESBO_O32_R)
    extrude(amount=RESSALTO_EXTRUS_O23_DEPTH)

    # Chanfro2: one chamfer whose edges measure the first distance from different faces: ONE call of the kernel's chamfer builder (chamfer() names one face for all edges)
    chanfro2_edges_1 = [part.edges().sort_by_distance(p)[0] for p in [
        (1.75, 4.975, -6.55),
    ]]
    chanfro2_side_1 = [part.faces().sort_by_distance(p)[0] for p in [
        (1.75, 4.975, -4.235),
    ]]
    chanfro2_edges_2 = [part.edges().sort_by_distance(p)[0] for p in [
        (27.643876913, 34.975, -6.55),
    ]]
    chanfro2_side_2 = [part.faces().sort_by_distance(p)[0] for p in [
        (27.643876913, 34.975, -4.235),
    ]]
    chanfro2 = BRepFilletAPI_MakeChamfer(part.part.solid().wrapped)
    for e in chanfro2_edges_1:
        chanfro2.Add(CHANFRO2_SIZE, CHANFRO2_SIZE2, e.wrapped, chanfro2_side_1[0].wrapped)  # the first distance lies on this face
    for e in chanfro2_edges_2:
        chanfro2.Add(CHANFRO2_SIZE, CHANFRO2_SIZE2, e.wrapped, chanfro2_side_2[0].wrapped)  # the first distance lies on this face
    add(Compound.cast(chanfro2.Shape()), mode=Mode.REPLACE)

    # Esboço33 → Ressalto-extrusão24 (add)
    with BuildSketch(Plane(origin=(0, 0, -0.92), x_dir=(-1, 0, 0), z_dir=(0, 0, -1))):
        with BuildLine():
            Line((3.196311276, 12.849099671), (3.224269109, 12.846096875))
            Line((3.224269109, 12.846096875), (4.292171901, 22.788912554))
            Line((4.292171901, 22.788912554), (2.690076099, 22.960984796))
            ThreePointArc((2.690076099, 22.960984796), (2.95476648, 20.646044994), (2.912651997, 18.316402606))
            Line((2.912651997, 18.316402606), (3.196311276, 12.849099671))
        make_face()
        with BuildLine():
            Line((1.622173307, 13.018169117), (3.196311276, 12.849099671))
            Line((3.196311276, 12.849099671), (2.912651997, 18.316402606))
            ThreePointArc((2.912651997, 18.316402606), (2.472970379, 15.617218633), (1.622173307, 13.018169117))
        make_face()
    extrude(amount=RESSALTO_EXTRUS_O24_DEPTH)

    # Esboço34 → Ressalto-extrusão25 (add)
    with BuildSketch(Plane(origin=(-1.823505509, -0.195852632, 0), x_dir=(0, 0, 1), z_dir=(-0.9942815679049348, -0.10679027916671441, 0))):
        with Locations(Location((-5.92, 18.116957941, 0), (0, 0, 270))):
            Circle(ESBO_O34_R)
    extrude(amount=RESSALTO_EXTRUS_O25_DEPTH)

    # Filete11
    filete11_edges = [part.edges().sort_by_distance(p)[0] for p in [
        (0, -0.625, 0),
    ]]
    fillet(filete11_edges, radius=FILETE11_R)

    # Filete12
    filete12_edges = [part.edges().sort_by_distance(p)[0] for p in [
        (0, 0.625, 1.25),
    ]]
    fillet(filete12_edges, radius=FILETE12_R)


with BuildPart() as body_2:
    # Esboço35 → Ressalto-extrusão26 (new body)
    with BuildSketch(Plane.XY.offset(12.1)):
        with Locations(Location((-398.7, 19.8, 0), (0, 0, 180))):
            Circle(ESBO_O35_R)
    extrude(amount=RESSALTO_EXTRUS_O26_DEPTH)

    # Esboço37 → Ressalto-extrusão27 (add)
    with BuildSketch(Plane.XY.offset(19.7)):
        with Locations((-398.7, 19.8)):
            Circle(ESBO_O37_R)
    extrude(amount=-RESSALTO_EXTRUS_O27_DEPTH)

    # Chanfro3
    chanfro3_edges = [body_2.edges().sort_by_distance(p)[0] for p in [
        (-407.6, 19.8, 18.2),
    ]]
    chamfer(chanfro3_edges, length=CHANFRO3_SIZE)

    # Esboço38 → Ressalto-extrusão28 (add)
    with BuildSketch(Plane(origin=(0, 0, 12.1), x_dir=(-1, 0, 0), z_dir=(0, 0, -1))):
        with Locations(Location((398.7, 19.8, 0), (0, 0, 180))):
            Circle(ESBO_O38_R)
    extrude(amount=RESSALTO_EXTRUS_O28_DEPTH)

    # Esboço39 → Corte-extrusão7 (cut, two sides: drawn at the far end of the back side and taken through both)
    with BuildSketch(Plane.XY.offset(19.7).offset(-CORTE_EXTRUS_O7_DEPTH_BACK)):
        with Locations(Location((-398.7, 19.8, 0), (0, 0, 180))):
            Circle(ESBO_O39_R)
    extrude(amount=CORTE_EXTRUS_O7_DEPTH + CORTE_EXTRUS_O7_DEPTH_BACK, mode=Mode.SUBTRACT)

    # Filete13
    filete13_edges = [body_2.edges().sort_by_distance(p)[0] for p in [
        (-395.525, 19.8, 19.7),
        (-395.525, 19.8, 10.6),
    ]]
    fillet(filete13_edges, radius=FILETE13_R)


solid = body_2.part
